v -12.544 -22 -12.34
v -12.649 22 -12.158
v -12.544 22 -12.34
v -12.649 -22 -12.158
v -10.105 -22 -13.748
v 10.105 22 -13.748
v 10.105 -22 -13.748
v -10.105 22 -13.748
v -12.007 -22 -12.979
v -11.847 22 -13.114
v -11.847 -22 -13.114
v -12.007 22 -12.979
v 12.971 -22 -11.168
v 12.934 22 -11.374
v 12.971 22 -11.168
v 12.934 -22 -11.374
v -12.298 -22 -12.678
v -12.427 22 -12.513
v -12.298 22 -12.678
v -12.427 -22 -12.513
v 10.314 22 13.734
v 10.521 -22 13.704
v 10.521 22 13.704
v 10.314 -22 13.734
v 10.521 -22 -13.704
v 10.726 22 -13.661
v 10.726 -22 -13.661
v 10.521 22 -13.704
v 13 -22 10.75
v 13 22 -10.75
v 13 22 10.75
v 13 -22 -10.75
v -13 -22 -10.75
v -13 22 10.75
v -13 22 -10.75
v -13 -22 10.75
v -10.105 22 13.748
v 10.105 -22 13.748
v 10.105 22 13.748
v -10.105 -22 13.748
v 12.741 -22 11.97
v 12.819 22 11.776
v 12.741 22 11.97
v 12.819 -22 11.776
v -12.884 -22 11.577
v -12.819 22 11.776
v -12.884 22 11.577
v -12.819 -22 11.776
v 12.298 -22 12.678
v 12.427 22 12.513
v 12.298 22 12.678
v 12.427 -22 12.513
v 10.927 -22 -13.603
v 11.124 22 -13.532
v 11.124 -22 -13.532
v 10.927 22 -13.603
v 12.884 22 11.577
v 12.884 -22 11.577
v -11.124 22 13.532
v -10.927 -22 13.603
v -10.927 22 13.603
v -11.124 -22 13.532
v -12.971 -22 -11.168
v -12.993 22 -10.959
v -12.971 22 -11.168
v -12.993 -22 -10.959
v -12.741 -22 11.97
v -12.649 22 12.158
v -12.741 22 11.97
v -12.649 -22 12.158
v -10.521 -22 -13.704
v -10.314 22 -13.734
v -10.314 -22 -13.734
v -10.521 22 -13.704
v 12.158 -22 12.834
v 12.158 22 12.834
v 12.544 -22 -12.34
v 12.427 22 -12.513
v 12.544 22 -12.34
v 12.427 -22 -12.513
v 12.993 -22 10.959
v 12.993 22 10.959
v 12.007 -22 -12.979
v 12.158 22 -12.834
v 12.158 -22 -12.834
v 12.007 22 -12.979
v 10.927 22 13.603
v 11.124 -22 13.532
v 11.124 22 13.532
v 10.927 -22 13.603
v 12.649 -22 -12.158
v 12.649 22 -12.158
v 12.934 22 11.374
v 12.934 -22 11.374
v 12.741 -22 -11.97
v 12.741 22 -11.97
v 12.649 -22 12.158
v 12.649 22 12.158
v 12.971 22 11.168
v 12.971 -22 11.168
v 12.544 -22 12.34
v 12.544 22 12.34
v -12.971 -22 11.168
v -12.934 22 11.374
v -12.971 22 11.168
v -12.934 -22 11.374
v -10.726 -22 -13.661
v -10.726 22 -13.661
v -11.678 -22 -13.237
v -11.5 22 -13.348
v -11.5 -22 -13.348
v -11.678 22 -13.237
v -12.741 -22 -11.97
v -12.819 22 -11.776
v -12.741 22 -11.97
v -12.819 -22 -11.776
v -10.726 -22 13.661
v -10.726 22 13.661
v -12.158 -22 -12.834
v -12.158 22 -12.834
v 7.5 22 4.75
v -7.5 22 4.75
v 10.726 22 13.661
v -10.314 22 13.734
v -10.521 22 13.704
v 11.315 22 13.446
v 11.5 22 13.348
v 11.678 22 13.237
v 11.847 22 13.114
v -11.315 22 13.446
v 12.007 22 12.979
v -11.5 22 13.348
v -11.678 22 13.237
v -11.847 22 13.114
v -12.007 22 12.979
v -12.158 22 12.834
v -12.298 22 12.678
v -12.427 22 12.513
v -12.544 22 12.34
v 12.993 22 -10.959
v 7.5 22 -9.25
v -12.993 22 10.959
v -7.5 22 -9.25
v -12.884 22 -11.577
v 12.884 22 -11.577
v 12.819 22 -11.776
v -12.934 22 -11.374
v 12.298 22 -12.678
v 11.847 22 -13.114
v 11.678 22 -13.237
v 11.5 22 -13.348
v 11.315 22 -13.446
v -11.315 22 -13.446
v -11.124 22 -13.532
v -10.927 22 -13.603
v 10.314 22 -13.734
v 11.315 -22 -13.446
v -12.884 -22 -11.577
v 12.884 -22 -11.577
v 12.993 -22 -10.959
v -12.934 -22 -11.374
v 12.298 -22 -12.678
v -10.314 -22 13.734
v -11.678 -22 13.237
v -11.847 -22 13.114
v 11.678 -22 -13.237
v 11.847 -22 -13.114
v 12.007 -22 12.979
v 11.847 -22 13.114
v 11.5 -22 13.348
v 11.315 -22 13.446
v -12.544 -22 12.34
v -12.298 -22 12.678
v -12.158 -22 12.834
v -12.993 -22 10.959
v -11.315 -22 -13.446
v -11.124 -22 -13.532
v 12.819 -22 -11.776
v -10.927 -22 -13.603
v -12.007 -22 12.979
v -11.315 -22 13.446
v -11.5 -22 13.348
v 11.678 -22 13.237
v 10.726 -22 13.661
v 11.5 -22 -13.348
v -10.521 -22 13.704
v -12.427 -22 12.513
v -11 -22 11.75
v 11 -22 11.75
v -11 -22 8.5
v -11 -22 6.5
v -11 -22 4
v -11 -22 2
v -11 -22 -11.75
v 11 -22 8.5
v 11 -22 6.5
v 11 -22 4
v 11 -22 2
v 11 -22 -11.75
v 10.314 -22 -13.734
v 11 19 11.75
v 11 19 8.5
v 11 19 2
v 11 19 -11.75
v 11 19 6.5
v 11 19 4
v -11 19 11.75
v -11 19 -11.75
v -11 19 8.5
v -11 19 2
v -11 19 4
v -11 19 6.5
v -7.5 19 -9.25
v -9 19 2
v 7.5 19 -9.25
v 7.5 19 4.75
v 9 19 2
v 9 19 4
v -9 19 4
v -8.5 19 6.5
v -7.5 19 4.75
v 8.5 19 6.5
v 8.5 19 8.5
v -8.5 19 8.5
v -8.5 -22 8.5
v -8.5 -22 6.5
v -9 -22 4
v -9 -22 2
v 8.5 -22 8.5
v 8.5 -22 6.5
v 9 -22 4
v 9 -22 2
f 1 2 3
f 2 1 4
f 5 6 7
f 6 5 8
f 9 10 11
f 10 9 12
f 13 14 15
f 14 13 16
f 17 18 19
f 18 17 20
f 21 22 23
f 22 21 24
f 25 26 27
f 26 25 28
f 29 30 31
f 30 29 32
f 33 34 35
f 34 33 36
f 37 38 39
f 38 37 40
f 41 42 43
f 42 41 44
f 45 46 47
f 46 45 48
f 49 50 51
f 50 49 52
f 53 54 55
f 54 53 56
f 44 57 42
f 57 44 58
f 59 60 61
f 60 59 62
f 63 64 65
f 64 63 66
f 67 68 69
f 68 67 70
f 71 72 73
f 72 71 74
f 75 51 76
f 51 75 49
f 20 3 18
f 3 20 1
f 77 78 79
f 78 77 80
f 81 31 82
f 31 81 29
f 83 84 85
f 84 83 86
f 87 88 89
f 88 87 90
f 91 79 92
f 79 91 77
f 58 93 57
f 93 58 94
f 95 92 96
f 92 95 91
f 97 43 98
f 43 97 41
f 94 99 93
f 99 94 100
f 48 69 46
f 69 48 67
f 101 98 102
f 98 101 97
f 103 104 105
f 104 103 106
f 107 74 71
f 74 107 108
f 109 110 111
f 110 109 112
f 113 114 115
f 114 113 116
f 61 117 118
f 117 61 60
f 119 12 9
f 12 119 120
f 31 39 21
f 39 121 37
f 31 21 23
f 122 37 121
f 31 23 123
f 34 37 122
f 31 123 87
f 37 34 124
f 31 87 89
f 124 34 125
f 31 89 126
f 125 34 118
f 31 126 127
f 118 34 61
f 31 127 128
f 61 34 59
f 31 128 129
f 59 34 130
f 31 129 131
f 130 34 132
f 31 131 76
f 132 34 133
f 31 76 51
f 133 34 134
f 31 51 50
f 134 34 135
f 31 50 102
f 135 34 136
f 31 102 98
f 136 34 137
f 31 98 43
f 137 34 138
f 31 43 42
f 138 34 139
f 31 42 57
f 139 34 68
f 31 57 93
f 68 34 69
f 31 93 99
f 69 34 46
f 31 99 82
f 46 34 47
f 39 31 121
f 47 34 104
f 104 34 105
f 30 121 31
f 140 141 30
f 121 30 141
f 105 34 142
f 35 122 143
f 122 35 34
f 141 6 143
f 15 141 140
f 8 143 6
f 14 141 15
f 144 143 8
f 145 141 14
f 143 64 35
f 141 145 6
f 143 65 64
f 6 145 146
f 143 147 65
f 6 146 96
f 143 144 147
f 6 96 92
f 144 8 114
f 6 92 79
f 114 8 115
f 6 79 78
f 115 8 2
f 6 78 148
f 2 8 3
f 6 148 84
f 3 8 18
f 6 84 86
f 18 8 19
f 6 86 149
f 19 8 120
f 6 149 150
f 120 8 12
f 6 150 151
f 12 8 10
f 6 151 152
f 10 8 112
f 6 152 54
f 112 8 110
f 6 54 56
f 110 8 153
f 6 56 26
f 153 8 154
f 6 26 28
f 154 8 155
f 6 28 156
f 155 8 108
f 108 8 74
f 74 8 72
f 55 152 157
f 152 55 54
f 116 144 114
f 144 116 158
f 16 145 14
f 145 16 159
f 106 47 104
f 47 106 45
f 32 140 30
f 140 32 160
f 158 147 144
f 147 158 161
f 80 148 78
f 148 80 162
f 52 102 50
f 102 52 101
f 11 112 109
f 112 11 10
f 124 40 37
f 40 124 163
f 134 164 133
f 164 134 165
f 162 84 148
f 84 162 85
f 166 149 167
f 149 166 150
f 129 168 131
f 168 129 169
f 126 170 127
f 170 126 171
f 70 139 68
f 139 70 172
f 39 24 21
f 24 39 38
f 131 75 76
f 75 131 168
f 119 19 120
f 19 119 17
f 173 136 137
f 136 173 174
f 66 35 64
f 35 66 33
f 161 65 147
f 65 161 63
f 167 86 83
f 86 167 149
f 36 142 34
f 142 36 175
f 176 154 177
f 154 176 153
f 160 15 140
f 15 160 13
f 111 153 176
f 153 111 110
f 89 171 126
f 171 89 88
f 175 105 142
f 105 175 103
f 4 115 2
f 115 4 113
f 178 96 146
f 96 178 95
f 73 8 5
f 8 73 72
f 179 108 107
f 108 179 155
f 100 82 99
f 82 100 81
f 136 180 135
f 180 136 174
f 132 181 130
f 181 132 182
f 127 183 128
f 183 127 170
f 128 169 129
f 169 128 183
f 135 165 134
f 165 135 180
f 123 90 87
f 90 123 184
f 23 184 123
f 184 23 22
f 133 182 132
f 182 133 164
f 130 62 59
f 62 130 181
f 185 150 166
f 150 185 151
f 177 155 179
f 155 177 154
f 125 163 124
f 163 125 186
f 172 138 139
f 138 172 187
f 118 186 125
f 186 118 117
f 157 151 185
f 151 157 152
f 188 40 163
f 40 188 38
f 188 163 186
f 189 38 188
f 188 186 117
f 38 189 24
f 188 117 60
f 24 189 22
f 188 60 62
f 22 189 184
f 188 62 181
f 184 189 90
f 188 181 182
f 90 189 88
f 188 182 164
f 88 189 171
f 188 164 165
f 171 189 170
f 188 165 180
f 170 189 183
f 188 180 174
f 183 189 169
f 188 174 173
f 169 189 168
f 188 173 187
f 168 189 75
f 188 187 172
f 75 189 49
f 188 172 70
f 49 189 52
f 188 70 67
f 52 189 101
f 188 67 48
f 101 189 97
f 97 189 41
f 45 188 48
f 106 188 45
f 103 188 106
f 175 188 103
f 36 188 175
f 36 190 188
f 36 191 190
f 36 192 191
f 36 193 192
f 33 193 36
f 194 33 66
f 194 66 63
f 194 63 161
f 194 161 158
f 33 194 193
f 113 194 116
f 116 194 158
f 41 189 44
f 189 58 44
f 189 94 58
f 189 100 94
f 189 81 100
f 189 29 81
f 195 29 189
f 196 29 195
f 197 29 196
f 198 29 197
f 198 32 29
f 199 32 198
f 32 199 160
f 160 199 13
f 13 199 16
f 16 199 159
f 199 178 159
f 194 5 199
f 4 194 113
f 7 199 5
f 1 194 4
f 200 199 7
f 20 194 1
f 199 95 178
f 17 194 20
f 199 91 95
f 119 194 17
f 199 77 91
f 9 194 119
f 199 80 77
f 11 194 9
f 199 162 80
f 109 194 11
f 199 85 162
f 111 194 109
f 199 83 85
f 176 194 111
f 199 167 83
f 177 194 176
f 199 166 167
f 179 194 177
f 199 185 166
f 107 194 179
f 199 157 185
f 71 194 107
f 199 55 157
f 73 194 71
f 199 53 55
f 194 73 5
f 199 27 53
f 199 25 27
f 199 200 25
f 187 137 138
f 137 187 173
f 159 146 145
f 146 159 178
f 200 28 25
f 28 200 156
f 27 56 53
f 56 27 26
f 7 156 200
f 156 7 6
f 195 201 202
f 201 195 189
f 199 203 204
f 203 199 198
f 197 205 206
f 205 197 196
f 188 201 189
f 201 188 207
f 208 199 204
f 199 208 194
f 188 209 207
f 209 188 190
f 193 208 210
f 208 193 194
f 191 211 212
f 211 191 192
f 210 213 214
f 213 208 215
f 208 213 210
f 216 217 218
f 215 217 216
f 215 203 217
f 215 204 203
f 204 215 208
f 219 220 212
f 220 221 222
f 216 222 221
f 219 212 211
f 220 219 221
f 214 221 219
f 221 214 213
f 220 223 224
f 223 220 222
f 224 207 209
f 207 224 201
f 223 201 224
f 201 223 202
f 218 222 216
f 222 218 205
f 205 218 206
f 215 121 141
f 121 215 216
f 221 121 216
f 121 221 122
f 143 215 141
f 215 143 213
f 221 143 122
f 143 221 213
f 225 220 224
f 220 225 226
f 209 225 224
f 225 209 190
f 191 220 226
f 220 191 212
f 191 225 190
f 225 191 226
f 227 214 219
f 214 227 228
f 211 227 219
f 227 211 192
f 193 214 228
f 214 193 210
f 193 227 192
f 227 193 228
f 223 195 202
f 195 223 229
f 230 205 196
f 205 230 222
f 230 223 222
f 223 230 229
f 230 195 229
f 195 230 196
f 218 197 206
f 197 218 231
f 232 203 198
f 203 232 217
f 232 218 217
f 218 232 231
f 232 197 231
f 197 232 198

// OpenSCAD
// box to insert pcb and fix with 2 screws

pcb_size = [19,41,1.6]; // size of PCB

box_inner = [22,42,21+2.5];
thick = 2;

rail_top   = [2,42,2];
rail_bot   = [2.5,42,2];
rail_spc   = 2.5;

pcb_bottom = 2.5+3; // space from bottom
usb_pos = 14; // from PCB bottom

module pcb()
{
  translate([0,-thick,box_inner[2]/2-rail_bot[2]/2-pcb_bottom])
  cube(pcb_size,center=true);
}

module rounded_cube(v,r)
{
  minkowski()
  {
    h_minkowski=0.01;
    cube(v-[2*r,2*r,h_minkowski],center=true);
    cylinder(h=h_minkowski,r=r,$fn=90,center=true);
  };
}

module rail_old()
{
  difference()
  {
    cube(rail_outer,center=true);
    cube(rail_inner,center=true);
  }
}

module rail(i)
{
  translate([-i*rail_bot[0]/2,(rail_bot[1]-box_inner[1]-thick)/2,rail_bot[2]/2+rail_spc/2])
    cube(rail_bot,center=true);
  translate([-i*rail_top[0]/2,(rail_top[1]-box_inner[1]-thick)/2,-rail_top[2]/2-rail_spc/2])
    cube(rail_top,center=true);
}

module rails()
{
  for(i=[-1,1])
    translate([(box_inner[0]/2)*i,0,box_inner[2]/2-rail_bot[2]/2-pcb_bottom])
      rail(i);
}

// not used
module usb_connector_cut()
{
  translate([0,-box_inner[1]/2,+box_inner[2]/2-pcb_bottom-usb_pos])
  cube([31,10,6],center=true);
}

module rj12_connector_cut_rear()
{
  translate([0,box_inner[1]/2,+box_inner[2]/2-pcb_bottom-8.5])
  cube([15,10,14],center=true);
}

module rj12_connector_cut_side()
{
  translate([0,box_inner[1]/2-10,+box_inner[2]/2-pcb_bottom-16])
  cube([13,16,10],center=true);
}

// not used - can't screw thru antenna
module screw_holes()
{
  for(i=[-1,1])
  translate([i*2.54*3,box_inner[1]/2-6,box_inner[2]/2])
    cylinder(d=1.8,h=10,$fn=16,center=true);
}

module box()
{
  difference()
  {
    cube_dim=box_inner+[2,1,2]*thick;
    rotate([90,0,0])
    rounded_cube([cube_dim[0],cube_dim[2],cube_dim[1]],r=3);
    translate([0,-thick,0])
    cube(box_inner,center=true);
    // usb_connector_cut();
    rj12_connector_cut_rear();
    //rj12_connector_cut_side();
    // screw_holes();
  }
  rails();
}

box();
%pcb();
